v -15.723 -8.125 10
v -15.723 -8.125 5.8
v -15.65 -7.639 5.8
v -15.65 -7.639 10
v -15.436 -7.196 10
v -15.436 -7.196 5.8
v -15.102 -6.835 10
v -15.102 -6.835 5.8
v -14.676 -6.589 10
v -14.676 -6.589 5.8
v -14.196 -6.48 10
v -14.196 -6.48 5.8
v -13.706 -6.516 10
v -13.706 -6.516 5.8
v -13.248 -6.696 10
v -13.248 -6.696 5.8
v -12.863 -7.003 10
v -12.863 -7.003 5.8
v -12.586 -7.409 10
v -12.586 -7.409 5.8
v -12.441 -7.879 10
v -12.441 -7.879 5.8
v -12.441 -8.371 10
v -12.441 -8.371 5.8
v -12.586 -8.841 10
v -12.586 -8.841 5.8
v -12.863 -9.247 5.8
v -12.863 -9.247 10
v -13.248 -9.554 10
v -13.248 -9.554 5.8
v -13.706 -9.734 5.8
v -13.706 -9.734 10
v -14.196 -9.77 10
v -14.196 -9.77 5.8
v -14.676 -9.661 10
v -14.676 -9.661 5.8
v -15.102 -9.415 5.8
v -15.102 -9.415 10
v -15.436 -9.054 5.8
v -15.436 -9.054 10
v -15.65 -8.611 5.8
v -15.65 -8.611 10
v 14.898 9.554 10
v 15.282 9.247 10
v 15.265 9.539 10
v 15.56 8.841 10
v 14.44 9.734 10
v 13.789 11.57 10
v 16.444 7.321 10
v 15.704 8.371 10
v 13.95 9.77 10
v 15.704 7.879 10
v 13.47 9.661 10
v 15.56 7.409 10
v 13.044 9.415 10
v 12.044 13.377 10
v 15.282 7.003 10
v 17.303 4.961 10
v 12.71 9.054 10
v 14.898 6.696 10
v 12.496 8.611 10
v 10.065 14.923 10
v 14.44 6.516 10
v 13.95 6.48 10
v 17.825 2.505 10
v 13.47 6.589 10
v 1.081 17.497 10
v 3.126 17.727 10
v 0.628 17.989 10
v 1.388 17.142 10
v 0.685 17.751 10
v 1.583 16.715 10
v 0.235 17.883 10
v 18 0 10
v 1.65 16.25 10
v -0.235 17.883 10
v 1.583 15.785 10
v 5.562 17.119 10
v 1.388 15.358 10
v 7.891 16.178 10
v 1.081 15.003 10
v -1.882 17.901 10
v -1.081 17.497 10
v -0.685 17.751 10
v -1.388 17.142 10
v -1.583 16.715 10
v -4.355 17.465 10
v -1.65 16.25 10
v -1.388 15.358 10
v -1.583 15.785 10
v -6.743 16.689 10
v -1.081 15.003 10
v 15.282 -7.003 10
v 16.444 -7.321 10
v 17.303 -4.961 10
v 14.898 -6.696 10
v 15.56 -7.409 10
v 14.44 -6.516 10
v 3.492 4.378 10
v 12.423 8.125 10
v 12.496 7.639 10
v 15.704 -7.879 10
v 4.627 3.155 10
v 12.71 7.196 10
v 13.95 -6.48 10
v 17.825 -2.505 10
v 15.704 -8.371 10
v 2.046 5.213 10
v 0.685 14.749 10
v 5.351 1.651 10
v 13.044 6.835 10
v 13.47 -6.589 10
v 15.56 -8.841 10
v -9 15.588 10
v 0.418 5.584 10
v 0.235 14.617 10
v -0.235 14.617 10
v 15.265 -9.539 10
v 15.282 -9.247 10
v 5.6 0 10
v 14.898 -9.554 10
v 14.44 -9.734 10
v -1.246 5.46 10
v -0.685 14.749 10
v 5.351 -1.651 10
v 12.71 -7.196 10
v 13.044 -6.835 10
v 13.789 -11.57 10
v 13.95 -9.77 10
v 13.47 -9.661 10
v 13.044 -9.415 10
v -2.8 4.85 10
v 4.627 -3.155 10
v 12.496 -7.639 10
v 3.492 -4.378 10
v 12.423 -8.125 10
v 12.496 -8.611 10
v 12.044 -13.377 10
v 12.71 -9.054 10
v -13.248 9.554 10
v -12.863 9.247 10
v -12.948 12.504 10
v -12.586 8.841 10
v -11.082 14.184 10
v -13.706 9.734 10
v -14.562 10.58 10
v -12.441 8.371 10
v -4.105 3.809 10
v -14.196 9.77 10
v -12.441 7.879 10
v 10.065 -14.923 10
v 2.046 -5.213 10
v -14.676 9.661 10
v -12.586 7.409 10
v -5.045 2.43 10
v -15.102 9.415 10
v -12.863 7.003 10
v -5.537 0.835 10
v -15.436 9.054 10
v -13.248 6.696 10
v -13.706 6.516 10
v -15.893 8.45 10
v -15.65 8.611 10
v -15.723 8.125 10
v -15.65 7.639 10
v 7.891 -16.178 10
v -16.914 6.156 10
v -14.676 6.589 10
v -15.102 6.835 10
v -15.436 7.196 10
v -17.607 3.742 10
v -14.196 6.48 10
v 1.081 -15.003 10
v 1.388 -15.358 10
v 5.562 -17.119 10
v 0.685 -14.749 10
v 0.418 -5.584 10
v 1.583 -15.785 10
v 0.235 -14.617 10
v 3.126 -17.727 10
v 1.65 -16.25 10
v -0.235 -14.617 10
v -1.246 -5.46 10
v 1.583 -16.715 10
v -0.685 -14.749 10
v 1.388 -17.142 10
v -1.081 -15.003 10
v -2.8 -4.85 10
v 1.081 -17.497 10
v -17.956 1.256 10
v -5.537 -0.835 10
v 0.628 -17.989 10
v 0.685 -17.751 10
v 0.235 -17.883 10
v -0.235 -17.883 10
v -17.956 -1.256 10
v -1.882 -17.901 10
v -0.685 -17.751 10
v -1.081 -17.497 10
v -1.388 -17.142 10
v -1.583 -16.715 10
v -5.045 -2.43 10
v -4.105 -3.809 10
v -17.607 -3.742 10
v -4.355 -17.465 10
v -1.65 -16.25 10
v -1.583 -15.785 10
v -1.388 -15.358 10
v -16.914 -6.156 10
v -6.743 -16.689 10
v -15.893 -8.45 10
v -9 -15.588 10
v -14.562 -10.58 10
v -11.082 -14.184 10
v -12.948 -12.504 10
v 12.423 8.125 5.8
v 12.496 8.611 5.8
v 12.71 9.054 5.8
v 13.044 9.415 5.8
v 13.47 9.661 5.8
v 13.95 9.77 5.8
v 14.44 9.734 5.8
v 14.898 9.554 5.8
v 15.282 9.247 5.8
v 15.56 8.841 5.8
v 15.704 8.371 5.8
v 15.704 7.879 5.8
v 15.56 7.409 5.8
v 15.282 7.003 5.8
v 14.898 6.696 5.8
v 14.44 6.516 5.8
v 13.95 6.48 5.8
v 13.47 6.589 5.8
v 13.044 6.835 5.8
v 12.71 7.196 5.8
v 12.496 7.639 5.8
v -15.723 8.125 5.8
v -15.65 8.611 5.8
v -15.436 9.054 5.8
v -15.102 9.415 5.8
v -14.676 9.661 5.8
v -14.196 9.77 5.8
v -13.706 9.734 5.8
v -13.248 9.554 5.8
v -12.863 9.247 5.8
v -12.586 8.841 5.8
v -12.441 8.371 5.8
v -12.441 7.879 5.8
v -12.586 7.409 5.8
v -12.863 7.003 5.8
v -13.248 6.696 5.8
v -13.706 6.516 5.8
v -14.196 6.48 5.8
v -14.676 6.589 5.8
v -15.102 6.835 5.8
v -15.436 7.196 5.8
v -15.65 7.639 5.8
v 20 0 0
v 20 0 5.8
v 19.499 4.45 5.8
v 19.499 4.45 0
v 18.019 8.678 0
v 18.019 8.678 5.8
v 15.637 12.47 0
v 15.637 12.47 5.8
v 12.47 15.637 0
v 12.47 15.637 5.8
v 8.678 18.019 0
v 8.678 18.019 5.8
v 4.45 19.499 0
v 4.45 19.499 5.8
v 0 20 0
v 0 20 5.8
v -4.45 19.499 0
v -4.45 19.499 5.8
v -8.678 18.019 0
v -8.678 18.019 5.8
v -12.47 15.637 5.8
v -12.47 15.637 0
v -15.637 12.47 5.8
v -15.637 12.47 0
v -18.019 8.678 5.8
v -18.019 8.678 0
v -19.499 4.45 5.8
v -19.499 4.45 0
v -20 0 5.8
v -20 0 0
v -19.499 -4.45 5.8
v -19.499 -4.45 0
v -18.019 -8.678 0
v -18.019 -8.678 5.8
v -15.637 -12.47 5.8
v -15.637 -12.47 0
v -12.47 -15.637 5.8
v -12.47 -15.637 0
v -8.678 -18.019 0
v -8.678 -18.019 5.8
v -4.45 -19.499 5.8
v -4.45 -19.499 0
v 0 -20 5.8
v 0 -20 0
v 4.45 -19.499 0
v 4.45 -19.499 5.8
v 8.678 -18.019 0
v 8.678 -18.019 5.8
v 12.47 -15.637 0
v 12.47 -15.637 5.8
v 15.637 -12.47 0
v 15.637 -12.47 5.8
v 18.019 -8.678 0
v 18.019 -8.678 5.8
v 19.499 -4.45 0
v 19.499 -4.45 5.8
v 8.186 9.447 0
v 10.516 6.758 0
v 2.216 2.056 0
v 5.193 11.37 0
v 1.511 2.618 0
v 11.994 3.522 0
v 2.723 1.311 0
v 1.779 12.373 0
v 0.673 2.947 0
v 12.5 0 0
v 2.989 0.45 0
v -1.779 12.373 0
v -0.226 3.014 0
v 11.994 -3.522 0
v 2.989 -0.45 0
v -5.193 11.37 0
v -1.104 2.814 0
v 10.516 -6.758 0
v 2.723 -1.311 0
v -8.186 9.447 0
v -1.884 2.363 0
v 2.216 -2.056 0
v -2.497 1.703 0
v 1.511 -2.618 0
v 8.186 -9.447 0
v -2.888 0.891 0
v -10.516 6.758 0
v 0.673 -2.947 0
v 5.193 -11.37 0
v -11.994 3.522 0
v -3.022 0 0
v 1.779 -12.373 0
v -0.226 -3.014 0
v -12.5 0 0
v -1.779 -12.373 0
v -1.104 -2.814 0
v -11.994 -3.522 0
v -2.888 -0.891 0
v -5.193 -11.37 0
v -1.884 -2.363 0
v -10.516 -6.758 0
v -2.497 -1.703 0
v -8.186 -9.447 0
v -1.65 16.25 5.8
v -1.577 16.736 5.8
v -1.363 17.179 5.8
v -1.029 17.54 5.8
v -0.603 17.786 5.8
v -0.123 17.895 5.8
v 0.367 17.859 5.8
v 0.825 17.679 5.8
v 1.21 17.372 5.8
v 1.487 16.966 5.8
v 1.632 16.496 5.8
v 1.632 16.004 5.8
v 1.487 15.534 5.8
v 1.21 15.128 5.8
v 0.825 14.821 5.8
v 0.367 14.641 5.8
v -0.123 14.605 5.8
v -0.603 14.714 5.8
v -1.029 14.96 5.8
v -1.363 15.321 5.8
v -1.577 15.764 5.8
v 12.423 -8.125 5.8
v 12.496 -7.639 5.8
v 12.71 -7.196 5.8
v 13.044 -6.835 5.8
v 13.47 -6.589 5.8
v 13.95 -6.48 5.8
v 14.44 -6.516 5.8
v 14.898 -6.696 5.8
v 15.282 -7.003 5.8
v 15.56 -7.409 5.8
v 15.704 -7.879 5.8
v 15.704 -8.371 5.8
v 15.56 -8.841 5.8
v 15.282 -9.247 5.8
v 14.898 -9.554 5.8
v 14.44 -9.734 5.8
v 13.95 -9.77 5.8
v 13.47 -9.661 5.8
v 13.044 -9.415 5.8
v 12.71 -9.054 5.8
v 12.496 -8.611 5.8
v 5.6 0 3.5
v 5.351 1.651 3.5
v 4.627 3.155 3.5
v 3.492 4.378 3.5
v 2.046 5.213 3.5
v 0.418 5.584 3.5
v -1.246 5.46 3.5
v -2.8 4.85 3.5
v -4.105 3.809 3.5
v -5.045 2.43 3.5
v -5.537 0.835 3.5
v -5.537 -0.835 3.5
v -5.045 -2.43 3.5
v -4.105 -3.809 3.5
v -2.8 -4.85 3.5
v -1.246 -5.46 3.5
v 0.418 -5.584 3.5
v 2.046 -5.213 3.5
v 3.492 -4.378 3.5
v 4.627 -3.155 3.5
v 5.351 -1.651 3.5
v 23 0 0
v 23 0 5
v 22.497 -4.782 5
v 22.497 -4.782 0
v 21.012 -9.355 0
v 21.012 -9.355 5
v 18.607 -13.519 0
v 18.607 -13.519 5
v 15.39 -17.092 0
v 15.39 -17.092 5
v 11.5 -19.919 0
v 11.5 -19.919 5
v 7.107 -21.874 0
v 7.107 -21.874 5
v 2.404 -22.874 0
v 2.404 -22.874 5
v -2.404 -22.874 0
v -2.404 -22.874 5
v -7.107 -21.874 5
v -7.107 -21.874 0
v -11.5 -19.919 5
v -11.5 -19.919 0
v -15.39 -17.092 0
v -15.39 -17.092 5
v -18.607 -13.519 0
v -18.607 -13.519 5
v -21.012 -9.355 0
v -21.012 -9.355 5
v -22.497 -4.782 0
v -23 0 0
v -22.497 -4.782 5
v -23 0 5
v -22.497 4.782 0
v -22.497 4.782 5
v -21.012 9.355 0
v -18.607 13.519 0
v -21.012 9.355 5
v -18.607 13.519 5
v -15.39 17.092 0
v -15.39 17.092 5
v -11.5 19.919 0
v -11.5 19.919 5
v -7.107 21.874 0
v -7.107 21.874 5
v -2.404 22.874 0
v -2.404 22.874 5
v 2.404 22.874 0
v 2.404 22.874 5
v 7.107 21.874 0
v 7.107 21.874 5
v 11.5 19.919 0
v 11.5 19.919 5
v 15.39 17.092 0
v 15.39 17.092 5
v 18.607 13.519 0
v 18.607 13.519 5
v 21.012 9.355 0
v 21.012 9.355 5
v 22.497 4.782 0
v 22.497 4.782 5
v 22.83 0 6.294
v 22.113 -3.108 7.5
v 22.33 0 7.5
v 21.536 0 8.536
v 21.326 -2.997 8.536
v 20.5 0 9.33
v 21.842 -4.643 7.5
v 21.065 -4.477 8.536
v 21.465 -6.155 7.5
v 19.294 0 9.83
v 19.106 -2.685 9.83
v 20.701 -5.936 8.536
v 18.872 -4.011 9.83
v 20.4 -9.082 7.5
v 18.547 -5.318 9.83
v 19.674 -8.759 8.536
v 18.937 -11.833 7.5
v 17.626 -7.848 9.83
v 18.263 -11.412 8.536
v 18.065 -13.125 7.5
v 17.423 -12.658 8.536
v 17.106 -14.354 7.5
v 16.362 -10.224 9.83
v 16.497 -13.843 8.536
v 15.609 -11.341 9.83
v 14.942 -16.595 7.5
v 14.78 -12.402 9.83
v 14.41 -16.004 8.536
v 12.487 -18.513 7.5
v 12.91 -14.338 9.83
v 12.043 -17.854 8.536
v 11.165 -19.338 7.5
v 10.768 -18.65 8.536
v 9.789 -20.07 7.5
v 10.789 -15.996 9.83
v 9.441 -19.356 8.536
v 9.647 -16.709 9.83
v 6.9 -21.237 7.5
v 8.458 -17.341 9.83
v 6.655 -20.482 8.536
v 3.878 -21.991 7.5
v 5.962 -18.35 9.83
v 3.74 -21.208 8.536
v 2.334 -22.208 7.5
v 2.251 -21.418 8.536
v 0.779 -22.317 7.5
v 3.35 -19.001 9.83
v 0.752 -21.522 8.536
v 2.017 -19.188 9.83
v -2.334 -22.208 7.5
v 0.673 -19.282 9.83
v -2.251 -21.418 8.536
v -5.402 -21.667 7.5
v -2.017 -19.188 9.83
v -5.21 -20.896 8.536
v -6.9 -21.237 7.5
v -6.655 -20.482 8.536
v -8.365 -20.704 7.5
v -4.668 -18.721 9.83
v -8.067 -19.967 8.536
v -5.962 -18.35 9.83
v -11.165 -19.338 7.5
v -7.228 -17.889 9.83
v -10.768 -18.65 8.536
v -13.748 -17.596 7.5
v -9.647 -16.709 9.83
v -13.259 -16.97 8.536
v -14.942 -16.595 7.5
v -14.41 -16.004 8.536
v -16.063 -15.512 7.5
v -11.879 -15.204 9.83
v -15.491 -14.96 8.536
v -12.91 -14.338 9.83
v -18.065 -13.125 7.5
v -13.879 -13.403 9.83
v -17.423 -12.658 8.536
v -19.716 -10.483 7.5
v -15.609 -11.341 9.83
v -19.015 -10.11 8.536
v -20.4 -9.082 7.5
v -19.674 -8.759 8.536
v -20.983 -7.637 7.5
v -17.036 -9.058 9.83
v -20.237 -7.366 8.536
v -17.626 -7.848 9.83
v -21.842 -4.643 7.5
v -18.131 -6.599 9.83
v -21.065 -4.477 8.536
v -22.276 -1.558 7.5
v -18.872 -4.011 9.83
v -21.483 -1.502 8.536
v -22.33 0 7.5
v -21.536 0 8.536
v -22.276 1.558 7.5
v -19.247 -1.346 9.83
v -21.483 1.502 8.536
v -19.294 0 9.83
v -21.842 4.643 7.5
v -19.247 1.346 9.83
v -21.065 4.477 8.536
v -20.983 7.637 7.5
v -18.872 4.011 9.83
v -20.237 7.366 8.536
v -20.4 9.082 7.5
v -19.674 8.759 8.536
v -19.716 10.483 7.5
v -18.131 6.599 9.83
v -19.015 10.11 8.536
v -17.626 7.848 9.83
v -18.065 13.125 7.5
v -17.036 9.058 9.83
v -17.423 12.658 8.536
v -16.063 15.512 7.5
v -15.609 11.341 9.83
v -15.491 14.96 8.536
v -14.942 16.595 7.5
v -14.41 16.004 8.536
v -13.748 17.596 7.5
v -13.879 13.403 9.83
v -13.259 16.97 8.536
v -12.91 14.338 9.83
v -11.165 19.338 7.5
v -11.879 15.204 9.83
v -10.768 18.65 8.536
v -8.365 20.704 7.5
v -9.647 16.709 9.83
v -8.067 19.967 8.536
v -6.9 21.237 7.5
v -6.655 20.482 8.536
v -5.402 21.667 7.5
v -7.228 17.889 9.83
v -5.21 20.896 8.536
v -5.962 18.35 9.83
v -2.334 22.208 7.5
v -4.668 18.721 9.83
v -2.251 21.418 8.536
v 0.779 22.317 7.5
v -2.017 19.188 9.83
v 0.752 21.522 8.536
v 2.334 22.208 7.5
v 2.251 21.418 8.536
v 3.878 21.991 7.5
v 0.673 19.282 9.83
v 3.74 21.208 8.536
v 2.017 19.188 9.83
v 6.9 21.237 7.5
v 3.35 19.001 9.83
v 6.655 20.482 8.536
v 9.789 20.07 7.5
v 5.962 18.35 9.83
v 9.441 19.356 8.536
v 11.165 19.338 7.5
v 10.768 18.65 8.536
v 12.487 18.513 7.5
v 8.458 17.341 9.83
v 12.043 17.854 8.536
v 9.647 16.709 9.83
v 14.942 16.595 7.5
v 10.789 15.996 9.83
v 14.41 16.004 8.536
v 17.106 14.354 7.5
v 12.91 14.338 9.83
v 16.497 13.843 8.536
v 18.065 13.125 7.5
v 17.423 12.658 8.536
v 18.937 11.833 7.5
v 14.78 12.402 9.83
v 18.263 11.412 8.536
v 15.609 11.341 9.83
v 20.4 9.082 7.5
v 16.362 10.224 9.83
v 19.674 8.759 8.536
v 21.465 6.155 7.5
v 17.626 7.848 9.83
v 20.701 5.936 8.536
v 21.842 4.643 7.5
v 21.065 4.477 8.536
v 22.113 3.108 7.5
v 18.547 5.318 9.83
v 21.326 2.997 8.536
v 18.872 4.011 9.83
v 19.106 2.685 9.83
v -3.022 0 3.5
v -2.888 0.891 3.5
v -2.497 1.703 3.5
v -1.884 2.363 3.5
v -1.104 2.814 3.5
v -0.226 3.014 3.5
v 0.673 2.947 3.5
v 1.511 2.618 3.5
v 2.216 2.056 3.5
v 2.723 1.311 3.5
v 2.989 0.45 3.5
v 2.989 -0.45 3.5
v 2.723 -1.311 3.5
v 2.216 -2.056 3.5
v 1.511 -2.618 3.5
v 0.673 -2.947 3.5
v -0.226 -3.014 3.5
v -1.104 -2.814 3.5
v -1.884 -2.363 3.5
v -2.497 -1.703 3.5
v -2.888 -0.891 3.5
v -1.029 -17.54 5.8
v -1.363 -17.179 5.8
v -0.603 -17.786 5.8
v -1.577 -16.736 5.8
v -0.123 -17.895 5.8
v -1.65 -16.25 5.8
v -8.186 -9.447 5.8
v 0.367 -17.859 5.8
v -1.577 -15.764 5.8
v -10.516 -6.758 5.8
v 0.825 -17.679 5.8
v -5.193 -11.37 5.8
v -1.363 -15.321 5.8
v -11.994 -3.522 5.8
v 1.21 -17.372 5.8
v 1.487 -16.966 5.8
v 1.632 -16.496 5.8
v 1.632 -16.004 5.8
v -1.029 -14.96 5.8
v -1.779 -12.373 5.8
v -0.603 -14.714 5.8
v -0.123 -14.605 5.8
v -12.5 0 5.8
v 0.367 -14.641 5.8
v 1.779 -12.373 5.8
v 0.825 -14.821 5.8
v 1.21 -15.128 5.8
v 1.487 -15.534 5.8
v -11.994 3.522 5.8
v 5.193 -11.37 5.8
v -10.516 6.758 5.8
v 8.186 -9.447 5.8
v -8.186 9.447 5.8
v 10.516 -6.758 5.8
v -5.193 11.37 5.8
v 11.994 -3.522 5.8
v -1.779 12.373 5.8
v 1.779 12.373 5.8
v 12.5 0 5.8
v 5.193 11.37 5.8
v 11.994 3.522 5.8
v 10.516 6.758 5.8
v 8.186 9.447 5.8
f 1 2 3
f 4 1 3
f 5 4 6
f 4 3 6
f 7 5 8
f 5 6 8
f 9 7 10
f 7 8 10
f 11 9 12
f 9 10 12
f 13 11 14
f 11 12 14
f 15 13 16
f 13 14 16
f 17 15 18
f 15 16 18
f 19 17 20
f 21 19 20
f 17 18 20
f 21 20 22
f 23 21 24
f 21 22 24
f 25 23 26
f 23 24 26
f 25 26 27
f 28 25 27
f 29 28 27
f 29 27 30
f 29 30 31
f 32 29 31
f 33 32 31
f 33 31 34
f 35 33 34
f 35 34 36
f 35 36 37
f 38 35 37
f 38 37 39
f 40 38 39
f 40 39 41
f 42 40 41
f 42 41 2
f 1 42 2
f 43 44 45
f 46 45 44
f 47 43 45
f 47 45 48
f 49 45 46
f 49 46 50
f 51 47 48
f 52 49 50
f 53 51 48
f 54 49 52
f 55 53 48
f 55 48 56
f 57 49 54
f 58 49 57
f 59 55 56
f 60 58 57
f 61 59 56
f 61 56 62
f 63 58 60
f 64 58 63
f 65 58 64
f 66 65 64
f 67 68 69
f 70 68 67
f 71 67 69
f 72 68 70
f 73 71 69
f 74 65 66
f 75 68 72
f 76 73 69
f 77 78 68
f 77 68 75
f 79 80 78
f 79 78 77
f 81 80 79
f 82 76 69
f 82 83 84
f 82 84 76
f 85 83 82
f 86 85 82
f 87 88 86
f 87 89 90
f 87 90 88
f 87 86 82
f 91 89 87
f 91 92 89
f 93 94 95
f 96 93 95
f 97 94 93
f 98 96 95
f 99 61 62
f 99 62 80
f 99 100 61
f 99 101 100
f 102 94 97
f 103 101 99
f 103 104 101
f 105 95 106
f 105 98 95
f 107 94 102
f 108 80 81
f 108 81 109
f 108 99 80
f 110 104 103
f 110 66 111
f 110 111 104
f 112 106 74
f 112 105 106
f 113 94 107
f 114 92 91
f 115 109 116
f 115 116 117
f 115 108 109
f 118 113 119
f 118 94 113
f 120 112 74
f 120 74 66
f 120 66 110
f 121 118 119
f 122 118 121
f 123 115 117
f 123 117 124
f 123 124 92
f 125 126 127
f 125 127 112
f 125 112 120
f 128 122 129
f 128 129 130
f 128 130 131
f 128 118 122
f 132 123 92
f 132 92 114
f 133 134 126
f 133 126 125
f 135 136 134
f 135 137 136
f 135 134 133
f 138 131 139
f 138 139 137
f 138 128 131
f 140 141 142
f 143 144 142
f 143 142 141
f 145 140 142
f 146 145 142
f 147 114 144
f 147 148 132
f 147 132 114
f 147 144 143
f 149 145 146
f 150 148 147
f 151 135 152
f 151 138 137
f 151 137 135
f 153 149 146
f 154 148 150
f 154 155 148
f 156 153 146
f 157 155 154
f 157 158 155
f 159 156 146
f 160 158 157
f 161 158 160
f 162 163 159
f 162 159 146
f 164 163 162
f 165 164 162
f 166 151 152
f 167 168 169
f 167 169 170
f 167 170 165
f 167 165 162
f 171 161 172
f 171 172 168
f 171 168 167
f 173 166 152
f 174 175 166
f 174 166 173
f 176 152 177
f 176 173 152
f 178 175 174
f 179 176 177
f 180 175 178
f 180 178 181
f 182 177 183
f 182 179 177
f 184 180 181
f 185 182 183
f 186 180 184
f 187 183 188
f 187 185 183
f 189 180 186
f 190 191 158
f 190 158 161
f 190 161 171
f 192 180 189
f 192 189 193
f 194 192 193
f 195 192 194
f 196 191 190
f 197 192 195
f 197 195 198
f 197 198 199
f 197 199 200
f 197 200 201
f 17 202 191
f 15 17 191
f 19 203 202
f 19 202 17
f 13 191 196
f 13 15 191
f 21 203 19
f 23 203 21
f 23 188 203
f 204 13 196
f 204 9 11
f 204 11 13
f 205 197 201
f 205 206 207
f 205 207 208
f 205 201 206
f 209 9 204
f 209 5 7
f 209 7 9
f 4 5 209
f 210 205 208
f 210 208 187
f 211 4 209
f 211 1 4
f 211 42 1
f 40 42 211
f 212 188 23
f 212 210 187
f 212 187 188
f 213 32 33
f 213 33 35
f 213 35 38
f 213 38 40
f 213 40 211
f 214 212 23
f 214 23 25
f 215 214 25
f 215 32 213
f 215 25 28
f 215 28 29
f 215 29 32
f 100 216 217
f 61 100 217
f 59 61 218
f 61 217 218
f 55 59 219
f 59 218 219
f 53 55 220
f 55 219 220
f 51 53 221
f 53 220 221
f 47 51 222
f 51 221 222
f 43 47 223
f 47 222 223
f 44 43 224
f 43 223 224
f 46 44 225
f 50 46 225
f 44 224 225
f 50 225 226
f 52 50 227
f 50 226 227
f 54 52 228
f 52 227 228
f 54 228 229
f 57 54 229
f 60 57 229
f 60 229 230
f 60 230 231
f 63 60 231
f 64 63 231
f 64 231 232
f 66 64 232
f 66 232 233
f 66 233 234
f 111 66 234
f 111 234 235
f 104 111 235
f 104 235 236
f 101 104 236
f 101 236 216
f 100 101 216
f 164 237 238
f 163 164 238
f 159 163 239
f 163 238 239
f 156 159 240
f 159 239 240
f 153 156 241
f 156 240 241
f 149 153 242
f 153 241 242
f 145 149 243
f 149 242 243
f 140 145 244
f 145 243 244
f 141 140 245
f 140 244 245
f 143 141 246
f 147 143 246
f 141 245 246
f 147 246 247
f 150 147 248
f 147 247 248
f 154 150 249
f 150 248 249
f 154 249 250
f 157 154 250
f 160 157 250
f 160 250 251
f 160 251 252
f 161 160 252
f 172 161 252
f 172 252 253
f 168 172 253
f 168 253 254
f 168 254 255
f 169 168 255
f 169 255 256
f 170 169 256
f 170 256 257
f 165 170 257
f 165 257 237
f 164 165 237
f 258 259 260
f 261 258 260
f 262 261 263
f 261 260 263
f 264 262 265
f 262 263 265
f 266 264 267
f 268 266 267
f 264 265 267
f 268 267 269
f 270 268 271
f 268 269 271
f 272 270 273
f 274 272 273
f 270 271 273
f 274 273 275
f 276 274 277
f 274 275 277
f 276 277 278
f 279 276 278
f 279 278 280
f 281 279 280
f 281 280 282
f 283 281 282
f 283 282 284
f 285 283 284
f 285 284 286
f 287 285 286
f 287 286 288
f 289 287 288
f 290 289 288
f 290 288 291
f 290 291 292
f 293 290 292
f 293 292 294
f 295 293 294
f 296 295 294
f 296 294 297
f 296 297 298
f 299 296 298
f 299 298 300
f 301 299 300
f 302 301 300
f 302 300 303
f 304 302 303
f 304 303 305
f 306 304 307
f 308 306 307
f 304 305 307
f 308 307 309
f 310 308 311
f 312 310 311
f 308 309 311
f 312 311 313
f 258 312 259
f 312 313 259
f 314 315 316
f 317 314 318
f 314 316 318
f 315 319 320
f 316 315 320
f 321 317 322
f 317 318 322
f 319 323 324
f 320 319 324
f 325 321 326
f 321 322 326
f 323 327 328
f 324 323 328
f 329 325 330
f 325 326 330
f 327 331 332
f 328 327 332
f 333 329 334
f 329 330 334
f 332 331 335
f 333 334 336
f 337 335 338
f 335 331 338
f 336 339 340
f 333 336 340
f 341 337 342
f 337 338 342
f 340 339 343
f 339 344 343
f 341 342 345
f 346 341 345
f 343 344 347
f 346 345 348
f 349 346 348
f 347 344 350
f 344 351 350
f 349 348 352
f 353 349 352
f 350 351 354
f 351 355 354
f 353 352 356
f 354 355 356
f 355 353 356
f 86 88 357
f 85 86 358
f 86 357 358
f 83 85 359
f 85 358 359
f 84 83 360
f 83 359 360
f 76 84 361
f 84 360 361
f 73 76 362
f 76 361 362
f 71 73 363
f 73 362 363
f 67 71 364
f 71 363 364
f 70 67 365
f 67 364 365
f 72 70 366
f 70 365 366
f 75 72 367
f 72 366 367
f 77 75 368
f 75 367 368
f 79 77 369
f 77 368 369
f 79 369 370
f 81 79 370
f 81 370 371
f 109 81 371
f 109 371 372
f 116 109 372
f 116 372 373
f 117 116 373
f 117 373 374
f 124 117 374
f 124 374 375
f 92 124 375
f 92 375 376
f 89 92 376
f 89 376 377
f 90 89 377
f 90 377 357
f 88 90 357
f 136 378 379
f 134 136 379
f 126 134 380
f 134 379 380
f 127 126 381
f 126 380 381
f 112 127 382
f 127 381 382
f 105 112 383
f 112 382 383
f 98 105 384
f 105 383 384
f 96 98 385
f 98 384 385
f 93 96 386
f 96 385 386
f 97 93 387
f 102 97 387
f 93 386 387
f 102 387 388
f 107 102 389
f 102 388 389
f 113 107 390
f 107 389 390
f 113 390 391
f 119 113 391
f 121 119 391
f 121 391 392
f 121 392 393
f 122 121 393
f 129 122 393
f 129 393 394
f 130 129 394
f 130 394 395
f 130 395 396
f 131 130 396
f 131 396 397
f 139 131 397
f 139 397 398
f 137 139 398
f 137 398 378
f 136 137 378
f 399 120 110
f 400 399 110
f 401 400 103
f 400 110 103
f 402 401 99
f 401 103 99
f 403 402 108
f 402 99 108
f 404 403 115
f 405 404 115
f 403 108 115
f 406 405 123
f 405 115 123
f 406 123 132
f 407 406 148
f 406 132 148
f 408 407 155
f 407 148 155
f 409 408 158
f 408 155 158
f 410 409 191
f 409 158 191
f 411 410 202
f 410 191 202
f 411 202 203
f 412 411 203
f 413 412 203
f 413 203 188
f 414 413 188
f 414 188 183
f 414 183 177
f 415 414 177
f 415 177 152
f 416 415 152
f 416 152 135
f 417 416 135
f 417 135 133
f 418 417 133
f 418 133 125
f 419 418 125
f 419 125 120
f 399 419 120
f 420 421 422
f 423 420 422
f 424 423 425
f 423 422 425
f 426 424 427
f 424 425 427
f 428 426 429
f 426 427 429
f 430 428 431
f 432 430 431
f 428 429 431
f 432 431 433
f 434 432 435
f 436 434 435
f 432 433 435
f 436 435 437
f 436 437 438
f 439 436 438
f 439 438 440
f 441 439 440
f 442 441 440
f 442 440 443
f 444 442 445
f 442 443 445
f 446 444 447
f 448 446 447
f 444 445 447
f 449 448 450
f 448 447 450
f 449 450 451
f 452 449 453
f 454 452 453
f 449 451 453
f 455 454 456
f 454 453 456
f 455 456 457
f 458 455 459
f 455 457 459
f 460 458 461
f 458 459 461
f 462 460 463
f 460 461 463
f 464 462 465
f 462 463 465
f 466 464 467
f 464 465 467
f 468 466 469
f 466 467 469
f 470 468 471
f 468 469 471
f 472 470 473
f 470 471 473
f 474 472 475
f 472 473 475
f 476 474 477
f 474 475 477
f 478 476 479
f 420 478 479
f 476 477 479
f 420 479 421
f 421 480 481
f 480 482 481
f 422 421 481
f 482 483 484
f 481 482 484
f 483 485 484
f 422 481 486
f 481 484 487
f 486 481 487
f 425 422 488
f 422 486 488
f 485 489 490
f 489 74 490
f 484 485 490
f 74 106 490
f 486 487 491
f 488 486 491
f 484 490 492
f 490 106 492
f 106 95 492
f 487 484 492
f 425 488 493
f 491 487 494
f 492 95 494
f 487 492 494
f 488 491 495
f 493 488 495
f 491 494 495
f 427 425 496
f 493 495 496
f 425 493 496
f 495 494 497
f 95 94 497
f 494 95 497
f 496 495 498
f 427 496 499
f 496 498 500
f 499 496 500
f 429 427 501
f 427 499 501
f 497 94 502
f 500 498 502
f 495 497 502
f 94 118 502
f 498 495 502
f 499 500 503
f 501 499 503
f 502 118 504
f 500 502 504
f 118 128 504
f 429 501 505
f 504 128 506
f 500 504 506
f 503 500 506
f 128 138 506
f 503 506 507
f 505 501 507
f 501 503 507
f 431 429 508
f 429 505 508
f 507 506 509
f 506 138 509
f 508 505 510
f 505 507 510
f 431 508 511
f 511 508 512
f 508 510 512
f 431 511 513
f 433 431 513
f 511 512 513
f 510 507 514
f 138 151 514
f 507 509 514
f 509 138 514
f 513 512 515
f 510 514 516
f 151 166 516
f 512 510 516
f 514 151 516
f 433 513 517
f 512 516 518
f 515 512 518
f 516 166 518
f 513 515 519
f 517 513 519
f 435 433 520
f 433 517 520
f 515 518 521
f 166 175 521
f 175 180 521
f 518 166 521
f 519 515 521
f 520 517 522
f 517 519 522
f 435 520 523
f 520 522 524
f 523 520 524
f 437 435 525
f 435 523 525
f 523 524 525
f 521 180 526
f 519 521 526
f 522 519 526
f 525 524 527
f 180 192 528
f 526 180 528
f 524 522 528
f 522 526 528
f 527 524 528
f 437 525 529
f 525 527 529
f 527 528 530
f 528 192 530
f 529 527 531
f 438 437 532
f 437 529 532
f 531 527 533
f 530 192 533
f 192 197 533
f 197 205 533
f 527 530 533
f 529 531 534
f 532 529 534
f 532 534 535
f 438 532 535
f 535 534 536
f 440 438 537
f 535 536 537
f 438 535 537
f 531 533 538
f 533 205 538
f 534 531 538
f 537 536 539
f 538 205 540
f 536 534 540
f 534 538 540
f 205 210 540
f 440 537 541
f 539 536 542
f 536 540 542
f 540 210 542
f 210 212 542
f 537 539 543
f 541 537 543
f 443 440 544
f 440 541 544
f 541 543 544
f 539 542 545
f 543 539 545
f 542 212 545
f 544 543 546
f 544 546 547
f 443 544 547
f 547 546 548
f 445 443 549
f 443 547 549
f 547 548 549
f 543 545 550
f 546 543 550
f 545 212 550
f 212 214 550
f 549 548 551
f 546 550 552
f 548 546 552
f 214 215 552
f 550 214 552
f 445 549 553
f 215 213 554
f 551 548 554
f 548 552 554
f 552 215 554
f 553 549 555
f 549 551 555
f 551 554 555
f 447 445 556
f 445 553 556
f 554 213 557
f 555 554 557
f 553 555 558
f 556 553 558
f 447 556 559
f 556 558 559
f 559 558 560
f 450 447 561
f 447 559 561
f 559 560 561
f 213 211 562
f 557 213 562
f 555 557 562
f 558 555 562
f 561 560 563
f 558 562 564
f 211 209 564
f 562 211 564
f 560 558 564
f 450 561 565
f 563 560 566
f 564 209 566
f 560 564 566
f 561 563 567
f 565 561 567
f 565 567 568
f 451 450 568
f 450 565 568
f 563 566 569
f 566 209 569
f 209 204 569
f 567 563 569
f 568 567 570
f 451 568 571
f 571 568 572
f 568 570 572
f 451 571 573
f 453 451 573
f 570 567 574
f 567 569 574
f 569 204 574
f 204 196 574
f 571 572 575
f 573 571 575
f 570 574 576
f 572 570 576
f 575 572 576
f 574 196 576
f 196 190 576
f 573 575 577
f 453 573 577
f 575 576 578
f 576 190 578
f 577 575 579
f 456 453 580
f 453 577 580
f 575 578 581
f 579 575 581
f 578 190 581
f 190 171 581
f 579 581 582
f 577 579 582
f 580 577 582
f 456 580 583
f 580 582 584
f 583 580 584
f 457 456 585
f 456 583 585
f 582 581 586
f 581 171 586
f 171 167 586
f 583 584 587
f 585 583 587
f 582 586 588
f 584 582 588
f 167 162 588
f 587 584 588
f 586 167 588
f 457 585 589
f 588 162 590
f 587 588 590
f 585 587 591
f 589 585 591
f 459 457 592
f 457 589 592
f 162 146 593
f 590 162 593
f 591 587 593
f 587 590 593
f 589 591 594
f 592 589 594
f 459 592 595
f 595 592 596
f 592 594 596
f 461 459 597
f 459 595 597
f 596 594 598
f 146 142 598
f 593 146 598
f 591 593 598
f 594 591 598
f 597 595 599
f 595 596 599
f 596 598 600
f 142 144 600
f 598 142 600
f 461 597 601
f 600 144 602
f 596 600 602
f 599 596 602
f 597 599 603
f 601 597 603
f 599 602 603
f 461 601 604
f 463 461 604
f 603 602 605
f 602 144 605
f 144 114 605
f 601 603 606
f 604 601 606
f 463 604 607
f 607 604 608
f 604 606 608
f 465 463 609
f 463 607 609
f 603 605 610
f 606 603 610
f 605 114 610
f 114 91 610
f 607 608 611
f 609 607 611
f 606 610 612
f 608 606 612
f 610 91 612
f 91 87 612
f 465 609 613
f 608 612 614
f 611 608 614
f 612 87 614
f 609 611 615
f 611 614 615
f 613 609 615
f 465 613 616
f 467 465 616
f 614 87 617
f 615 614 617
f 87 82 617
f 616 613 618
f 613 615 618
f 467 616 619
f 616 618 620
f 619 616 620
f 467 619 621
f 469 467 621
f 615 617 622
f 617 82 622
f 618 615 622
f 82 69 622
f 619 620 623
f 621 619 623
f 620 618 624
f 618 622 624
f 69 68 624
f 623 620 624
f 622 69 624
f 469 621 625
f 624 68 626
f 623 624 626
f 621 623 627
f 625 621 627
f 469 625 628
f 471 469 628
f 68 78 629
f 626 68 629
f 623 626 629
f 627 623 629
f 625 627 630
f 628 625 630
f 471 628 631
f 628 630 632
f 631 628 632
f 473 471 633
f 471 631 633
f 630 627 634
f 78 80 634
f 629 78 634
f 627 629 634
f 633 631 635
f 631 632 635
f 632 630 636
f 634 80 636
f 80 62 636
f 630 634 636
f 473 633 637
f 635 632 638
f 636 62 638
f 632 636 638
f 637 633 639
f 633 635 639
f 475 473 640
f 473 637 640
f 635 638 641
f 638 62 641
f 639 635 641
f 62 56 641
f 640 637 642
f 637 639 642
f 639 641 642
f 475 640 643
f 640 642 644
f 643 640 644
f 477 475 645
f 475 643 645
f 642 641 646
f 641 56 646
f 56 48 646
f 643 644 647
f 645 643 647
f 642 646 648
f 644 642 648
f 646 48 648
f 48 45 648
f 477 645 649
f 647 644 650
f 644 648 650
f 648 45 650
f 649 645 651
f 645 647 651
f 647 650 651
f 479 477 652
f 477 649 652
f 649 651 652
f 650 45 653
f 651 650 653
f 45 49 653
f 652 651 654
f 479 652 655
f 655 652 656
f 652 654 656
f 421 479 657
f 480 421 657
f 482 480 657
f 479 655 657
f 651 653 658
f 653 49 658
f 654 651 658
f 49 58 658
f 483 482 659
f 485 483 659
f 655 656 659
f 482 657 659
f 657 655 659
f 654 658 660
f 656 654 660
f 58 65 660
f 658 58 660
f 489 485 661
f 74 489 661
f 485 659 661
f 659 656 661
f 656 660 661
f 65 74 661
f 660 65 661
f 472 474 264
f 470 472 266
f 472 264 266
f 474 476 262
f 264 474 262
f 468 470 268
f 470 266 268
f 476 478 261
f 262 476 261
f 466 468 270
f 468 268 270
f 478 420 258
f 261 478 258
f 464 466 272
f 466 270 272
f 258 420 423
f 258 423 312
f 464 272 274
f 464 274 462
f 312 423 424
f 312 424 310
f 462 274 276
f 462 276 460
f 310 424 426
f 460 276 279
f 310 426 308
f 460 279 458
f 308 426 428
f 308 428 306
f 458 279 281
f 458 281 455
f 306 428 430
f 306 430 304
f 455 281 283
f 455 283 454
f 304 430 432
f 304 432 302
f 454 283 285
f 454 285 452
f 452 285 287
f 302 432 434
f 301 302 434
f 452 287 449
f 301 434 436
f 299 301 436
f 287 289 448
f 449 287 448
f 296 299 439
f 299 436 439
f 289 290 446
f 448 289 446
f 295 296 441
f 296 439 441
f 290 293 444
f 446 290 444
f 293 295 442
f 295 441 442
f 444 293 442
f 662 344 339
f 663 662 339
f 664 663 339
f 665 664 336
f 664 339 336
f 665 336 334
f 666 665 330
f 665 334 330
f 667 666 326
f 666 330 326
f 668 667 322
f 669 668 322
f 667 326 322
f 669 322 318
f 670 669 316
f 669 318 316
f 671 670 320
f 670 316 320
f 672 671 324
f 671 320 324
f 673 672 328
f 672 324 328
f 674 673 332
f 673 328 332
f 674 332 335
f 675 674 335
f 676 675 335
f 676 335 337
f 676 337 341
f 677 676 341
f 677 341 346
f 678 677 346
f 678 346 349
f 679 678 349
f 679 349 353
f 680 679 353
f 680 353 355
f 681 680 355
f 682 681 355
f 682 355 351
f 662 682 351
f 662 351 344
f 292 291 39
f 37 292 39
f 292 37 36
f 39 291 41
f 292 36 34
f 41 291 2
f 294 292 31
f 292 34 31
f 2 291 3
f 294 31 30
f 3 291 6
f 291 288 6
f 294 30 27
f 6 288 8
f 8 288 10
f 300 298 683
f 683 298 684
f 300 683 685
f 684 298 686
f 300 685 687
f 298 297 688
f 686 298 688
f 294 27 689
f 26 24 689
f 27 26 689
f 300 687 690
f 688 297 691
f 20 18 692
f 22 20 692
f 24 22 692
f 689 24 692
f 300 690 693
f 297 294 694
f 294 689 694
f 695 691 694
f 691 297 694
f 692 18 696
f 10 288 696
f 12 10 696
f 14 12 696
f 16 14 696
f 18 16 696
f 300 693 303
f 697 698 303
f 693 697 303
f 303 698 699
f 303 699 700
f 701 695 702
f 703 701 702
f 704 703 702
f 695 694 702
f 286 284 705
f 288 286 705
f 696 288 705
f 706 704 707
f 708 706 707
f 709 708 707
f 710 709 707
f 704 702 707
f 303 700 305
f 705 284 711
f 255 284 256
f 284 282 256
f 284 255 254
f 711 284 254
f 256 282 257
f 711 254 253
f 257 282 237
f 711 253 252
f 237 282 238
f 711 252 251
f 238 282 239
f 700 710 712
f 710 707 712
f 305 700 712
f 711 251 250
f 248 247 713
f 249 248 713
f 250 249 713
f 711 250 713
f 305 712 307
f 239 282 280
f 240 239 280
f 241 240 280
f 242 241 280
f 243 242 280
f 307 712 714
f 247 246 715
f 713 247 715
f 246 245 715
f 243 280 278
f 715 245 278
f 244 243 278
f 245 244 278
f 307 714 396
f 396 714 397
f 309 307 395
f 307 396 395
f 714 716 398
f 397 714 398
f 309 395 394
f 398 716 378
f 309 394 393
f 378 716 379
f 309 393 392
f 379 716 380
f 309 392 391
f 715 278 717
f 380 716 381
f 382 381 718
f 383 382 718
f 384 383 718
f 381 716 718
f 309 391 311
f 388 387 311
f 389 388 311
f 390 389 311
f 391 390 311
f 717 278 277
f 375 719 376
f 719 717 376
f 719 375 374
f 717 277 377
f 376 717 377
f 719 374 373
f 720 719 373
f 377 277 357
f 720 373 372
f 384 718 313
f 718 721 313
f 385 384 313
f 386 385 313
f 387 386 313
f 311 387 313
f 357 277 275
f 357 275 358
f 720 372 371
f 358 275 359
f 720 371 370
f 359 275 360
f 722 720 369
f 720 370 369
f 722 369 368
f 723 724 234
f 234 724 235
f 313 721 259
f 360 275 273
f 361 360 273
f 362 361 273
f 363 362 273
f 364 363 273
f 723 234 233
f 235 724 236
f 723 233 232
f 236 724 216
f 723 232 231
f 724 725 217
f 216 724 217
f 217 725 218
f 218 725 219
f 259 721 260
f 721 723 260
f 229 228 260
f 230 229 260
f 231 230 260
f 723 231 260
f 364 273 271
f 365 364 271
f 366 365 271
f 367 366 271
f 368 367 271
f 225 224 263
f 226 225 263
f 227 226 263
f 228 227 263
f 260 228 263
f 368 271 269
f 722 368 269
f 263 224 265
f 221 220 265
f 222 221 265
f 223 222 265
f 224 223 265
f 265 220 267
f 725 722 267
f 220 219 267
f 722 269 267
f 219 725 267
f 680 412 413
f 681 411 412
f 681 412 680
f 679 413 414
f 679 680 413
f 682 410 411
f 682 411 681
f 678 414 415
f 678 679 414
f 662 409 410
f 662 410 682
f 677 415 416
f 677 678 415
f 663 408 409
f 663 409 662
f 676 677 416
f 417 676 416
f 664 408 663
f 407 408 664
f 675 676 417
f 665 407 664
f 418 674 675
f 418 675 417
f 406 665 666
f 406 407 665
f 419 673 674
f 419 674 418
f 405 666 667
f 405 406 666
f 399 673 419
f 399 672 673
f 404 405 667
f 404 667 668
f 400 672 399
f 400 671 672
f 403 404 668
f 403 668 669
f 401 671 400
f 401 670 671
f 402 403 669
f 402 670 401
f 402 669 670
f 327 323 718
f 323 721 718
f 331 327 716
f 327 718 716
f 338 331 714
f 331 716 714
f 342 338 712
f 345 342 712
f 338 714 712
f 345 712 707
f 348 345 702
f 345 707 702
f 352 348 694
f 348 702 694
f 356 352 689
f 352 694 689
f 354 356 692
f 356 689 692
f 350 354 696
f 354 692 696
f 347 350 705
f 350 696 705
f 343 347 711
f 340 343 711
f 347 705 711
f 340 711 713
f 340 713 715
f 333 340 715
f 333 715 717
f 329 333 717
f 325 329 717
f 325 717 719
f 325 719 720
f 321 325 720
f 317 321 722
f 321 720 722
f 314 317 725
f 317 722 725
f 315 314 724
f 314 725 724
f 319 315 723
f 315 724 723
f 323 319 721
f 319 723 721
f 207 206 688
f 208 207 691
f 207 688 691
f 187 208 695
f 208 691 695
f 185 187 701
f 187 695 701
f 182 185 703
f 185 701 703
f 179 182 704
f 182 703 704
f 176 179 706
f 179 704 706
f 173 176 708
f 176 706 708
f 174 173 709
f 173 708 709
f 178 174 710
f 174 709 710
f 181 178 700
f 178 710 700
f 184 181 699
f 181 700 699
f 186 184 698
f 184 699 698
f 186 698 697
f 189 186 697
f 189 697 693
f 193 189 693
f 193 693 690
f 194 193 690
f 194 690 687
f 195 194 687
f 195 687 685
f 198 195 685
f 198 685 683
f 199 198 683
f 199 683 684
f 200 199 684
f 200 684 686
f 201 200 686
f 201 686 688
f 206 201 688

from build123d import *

# Parameters (mm, degrees)
SKETCH1_W                                           = 23
SKETCH1_H                                           = 10
HOLE1_D                                             = 40
HOLE1_DEPTH                                         = 5.8
SKETCH4_W                                           = 12.5
SKETCH4_H                                           = 5.8
F_4_CLEARANCE_HOLE1_D                               = 3.3
F_4_CLEARANCE_HOLE1_DEPTH                           = 10
CBORE_FOR_12_BINDING_HEAD_MACHINE_SCREW_D           = 6.045
CBORE_FOR_12_BINDING_HEAD_MACHINE_SCREW_DEPTH       = 10
CBORE_FOR_12_BINDING_HEAD_MACHINE_SCREW_CBORE_D     = 11.2
CBORE_FOR_12_BINDING_HEAD_MACHINE_SCREW_CBORE_DEPTH = 6.5
FILLET1_R                                           = 5


with BuildPart() as part:
    # Sketch1 → Revolve1 (revolve)
    with BuildSketch(Plane.XZ):
        with Locations((11.5, 5)):
            Rectangle(SKETCH1_W, SKETCH1_H)
    revolve(axis=Axis((0, 0, 10), (0, 0, -1)))

    # Hole1
    with Locations(Plane(origin=(0, 0, 0), x_dir=(-1, 0, 0), z_dir=(0, 0, -1))):
        with Locations((0, 0)):
            Hole(HOLE1_D / 2, depth=HOLE1_DEPTH)

    # Sketch4 → Revolve2 (revolve)
    with BuildSketch(Plane.XZ):
        with Locations((6.25, 2.9)):
            Rectangle(SKETCH4_W, SKETCH4_H)
    revolve(axis=Axis((0, 0, 5.8), (0, 0, -1)))

    # #4 Clearance Hole1
    with Locations(Plane.XY.offset(10)):
        with Locations((14.072912811, 8.125), (14.072912811, -8.125), (0, -16.25), (-14.072912811, -8.125), (-14.072912811, 8.125), (0, 16.25)):
            Hole(F_4_CLEARANCE_HOLE1_D / 2, depth=F_4_CLEARANCE_HOLE1_DEPTH)

    # CBORE for #12 Binding Head Machine Screw1
    with Locations(Plane.XY.offset(10)):
        with Locations((0, 0)):
            CounterBoreHole(CBORE_FOR_12_BINDING_HEAD_MACHINE_SCREW_D / 2, CBORE_FOR_12_BINDING_HEAD_MACHINE_SCREW_CBORE_D / 2, CBORE_FOR_12_BINDING_HEAD_MACHINE_SCREW_CBORE_DEPTH, depth=CBORE_FOR_12_BINDING_HEAD_MACHINE_SCREW_DEPTH)

    # Fillet1
    fillet1_edges = [part.edges().sort_by_distance(p)[0] for p in [
        (-23, 0, 10),
    ]]
    fillet(fillet1_edges, radius=FILLET1_R)


solid = part.part
